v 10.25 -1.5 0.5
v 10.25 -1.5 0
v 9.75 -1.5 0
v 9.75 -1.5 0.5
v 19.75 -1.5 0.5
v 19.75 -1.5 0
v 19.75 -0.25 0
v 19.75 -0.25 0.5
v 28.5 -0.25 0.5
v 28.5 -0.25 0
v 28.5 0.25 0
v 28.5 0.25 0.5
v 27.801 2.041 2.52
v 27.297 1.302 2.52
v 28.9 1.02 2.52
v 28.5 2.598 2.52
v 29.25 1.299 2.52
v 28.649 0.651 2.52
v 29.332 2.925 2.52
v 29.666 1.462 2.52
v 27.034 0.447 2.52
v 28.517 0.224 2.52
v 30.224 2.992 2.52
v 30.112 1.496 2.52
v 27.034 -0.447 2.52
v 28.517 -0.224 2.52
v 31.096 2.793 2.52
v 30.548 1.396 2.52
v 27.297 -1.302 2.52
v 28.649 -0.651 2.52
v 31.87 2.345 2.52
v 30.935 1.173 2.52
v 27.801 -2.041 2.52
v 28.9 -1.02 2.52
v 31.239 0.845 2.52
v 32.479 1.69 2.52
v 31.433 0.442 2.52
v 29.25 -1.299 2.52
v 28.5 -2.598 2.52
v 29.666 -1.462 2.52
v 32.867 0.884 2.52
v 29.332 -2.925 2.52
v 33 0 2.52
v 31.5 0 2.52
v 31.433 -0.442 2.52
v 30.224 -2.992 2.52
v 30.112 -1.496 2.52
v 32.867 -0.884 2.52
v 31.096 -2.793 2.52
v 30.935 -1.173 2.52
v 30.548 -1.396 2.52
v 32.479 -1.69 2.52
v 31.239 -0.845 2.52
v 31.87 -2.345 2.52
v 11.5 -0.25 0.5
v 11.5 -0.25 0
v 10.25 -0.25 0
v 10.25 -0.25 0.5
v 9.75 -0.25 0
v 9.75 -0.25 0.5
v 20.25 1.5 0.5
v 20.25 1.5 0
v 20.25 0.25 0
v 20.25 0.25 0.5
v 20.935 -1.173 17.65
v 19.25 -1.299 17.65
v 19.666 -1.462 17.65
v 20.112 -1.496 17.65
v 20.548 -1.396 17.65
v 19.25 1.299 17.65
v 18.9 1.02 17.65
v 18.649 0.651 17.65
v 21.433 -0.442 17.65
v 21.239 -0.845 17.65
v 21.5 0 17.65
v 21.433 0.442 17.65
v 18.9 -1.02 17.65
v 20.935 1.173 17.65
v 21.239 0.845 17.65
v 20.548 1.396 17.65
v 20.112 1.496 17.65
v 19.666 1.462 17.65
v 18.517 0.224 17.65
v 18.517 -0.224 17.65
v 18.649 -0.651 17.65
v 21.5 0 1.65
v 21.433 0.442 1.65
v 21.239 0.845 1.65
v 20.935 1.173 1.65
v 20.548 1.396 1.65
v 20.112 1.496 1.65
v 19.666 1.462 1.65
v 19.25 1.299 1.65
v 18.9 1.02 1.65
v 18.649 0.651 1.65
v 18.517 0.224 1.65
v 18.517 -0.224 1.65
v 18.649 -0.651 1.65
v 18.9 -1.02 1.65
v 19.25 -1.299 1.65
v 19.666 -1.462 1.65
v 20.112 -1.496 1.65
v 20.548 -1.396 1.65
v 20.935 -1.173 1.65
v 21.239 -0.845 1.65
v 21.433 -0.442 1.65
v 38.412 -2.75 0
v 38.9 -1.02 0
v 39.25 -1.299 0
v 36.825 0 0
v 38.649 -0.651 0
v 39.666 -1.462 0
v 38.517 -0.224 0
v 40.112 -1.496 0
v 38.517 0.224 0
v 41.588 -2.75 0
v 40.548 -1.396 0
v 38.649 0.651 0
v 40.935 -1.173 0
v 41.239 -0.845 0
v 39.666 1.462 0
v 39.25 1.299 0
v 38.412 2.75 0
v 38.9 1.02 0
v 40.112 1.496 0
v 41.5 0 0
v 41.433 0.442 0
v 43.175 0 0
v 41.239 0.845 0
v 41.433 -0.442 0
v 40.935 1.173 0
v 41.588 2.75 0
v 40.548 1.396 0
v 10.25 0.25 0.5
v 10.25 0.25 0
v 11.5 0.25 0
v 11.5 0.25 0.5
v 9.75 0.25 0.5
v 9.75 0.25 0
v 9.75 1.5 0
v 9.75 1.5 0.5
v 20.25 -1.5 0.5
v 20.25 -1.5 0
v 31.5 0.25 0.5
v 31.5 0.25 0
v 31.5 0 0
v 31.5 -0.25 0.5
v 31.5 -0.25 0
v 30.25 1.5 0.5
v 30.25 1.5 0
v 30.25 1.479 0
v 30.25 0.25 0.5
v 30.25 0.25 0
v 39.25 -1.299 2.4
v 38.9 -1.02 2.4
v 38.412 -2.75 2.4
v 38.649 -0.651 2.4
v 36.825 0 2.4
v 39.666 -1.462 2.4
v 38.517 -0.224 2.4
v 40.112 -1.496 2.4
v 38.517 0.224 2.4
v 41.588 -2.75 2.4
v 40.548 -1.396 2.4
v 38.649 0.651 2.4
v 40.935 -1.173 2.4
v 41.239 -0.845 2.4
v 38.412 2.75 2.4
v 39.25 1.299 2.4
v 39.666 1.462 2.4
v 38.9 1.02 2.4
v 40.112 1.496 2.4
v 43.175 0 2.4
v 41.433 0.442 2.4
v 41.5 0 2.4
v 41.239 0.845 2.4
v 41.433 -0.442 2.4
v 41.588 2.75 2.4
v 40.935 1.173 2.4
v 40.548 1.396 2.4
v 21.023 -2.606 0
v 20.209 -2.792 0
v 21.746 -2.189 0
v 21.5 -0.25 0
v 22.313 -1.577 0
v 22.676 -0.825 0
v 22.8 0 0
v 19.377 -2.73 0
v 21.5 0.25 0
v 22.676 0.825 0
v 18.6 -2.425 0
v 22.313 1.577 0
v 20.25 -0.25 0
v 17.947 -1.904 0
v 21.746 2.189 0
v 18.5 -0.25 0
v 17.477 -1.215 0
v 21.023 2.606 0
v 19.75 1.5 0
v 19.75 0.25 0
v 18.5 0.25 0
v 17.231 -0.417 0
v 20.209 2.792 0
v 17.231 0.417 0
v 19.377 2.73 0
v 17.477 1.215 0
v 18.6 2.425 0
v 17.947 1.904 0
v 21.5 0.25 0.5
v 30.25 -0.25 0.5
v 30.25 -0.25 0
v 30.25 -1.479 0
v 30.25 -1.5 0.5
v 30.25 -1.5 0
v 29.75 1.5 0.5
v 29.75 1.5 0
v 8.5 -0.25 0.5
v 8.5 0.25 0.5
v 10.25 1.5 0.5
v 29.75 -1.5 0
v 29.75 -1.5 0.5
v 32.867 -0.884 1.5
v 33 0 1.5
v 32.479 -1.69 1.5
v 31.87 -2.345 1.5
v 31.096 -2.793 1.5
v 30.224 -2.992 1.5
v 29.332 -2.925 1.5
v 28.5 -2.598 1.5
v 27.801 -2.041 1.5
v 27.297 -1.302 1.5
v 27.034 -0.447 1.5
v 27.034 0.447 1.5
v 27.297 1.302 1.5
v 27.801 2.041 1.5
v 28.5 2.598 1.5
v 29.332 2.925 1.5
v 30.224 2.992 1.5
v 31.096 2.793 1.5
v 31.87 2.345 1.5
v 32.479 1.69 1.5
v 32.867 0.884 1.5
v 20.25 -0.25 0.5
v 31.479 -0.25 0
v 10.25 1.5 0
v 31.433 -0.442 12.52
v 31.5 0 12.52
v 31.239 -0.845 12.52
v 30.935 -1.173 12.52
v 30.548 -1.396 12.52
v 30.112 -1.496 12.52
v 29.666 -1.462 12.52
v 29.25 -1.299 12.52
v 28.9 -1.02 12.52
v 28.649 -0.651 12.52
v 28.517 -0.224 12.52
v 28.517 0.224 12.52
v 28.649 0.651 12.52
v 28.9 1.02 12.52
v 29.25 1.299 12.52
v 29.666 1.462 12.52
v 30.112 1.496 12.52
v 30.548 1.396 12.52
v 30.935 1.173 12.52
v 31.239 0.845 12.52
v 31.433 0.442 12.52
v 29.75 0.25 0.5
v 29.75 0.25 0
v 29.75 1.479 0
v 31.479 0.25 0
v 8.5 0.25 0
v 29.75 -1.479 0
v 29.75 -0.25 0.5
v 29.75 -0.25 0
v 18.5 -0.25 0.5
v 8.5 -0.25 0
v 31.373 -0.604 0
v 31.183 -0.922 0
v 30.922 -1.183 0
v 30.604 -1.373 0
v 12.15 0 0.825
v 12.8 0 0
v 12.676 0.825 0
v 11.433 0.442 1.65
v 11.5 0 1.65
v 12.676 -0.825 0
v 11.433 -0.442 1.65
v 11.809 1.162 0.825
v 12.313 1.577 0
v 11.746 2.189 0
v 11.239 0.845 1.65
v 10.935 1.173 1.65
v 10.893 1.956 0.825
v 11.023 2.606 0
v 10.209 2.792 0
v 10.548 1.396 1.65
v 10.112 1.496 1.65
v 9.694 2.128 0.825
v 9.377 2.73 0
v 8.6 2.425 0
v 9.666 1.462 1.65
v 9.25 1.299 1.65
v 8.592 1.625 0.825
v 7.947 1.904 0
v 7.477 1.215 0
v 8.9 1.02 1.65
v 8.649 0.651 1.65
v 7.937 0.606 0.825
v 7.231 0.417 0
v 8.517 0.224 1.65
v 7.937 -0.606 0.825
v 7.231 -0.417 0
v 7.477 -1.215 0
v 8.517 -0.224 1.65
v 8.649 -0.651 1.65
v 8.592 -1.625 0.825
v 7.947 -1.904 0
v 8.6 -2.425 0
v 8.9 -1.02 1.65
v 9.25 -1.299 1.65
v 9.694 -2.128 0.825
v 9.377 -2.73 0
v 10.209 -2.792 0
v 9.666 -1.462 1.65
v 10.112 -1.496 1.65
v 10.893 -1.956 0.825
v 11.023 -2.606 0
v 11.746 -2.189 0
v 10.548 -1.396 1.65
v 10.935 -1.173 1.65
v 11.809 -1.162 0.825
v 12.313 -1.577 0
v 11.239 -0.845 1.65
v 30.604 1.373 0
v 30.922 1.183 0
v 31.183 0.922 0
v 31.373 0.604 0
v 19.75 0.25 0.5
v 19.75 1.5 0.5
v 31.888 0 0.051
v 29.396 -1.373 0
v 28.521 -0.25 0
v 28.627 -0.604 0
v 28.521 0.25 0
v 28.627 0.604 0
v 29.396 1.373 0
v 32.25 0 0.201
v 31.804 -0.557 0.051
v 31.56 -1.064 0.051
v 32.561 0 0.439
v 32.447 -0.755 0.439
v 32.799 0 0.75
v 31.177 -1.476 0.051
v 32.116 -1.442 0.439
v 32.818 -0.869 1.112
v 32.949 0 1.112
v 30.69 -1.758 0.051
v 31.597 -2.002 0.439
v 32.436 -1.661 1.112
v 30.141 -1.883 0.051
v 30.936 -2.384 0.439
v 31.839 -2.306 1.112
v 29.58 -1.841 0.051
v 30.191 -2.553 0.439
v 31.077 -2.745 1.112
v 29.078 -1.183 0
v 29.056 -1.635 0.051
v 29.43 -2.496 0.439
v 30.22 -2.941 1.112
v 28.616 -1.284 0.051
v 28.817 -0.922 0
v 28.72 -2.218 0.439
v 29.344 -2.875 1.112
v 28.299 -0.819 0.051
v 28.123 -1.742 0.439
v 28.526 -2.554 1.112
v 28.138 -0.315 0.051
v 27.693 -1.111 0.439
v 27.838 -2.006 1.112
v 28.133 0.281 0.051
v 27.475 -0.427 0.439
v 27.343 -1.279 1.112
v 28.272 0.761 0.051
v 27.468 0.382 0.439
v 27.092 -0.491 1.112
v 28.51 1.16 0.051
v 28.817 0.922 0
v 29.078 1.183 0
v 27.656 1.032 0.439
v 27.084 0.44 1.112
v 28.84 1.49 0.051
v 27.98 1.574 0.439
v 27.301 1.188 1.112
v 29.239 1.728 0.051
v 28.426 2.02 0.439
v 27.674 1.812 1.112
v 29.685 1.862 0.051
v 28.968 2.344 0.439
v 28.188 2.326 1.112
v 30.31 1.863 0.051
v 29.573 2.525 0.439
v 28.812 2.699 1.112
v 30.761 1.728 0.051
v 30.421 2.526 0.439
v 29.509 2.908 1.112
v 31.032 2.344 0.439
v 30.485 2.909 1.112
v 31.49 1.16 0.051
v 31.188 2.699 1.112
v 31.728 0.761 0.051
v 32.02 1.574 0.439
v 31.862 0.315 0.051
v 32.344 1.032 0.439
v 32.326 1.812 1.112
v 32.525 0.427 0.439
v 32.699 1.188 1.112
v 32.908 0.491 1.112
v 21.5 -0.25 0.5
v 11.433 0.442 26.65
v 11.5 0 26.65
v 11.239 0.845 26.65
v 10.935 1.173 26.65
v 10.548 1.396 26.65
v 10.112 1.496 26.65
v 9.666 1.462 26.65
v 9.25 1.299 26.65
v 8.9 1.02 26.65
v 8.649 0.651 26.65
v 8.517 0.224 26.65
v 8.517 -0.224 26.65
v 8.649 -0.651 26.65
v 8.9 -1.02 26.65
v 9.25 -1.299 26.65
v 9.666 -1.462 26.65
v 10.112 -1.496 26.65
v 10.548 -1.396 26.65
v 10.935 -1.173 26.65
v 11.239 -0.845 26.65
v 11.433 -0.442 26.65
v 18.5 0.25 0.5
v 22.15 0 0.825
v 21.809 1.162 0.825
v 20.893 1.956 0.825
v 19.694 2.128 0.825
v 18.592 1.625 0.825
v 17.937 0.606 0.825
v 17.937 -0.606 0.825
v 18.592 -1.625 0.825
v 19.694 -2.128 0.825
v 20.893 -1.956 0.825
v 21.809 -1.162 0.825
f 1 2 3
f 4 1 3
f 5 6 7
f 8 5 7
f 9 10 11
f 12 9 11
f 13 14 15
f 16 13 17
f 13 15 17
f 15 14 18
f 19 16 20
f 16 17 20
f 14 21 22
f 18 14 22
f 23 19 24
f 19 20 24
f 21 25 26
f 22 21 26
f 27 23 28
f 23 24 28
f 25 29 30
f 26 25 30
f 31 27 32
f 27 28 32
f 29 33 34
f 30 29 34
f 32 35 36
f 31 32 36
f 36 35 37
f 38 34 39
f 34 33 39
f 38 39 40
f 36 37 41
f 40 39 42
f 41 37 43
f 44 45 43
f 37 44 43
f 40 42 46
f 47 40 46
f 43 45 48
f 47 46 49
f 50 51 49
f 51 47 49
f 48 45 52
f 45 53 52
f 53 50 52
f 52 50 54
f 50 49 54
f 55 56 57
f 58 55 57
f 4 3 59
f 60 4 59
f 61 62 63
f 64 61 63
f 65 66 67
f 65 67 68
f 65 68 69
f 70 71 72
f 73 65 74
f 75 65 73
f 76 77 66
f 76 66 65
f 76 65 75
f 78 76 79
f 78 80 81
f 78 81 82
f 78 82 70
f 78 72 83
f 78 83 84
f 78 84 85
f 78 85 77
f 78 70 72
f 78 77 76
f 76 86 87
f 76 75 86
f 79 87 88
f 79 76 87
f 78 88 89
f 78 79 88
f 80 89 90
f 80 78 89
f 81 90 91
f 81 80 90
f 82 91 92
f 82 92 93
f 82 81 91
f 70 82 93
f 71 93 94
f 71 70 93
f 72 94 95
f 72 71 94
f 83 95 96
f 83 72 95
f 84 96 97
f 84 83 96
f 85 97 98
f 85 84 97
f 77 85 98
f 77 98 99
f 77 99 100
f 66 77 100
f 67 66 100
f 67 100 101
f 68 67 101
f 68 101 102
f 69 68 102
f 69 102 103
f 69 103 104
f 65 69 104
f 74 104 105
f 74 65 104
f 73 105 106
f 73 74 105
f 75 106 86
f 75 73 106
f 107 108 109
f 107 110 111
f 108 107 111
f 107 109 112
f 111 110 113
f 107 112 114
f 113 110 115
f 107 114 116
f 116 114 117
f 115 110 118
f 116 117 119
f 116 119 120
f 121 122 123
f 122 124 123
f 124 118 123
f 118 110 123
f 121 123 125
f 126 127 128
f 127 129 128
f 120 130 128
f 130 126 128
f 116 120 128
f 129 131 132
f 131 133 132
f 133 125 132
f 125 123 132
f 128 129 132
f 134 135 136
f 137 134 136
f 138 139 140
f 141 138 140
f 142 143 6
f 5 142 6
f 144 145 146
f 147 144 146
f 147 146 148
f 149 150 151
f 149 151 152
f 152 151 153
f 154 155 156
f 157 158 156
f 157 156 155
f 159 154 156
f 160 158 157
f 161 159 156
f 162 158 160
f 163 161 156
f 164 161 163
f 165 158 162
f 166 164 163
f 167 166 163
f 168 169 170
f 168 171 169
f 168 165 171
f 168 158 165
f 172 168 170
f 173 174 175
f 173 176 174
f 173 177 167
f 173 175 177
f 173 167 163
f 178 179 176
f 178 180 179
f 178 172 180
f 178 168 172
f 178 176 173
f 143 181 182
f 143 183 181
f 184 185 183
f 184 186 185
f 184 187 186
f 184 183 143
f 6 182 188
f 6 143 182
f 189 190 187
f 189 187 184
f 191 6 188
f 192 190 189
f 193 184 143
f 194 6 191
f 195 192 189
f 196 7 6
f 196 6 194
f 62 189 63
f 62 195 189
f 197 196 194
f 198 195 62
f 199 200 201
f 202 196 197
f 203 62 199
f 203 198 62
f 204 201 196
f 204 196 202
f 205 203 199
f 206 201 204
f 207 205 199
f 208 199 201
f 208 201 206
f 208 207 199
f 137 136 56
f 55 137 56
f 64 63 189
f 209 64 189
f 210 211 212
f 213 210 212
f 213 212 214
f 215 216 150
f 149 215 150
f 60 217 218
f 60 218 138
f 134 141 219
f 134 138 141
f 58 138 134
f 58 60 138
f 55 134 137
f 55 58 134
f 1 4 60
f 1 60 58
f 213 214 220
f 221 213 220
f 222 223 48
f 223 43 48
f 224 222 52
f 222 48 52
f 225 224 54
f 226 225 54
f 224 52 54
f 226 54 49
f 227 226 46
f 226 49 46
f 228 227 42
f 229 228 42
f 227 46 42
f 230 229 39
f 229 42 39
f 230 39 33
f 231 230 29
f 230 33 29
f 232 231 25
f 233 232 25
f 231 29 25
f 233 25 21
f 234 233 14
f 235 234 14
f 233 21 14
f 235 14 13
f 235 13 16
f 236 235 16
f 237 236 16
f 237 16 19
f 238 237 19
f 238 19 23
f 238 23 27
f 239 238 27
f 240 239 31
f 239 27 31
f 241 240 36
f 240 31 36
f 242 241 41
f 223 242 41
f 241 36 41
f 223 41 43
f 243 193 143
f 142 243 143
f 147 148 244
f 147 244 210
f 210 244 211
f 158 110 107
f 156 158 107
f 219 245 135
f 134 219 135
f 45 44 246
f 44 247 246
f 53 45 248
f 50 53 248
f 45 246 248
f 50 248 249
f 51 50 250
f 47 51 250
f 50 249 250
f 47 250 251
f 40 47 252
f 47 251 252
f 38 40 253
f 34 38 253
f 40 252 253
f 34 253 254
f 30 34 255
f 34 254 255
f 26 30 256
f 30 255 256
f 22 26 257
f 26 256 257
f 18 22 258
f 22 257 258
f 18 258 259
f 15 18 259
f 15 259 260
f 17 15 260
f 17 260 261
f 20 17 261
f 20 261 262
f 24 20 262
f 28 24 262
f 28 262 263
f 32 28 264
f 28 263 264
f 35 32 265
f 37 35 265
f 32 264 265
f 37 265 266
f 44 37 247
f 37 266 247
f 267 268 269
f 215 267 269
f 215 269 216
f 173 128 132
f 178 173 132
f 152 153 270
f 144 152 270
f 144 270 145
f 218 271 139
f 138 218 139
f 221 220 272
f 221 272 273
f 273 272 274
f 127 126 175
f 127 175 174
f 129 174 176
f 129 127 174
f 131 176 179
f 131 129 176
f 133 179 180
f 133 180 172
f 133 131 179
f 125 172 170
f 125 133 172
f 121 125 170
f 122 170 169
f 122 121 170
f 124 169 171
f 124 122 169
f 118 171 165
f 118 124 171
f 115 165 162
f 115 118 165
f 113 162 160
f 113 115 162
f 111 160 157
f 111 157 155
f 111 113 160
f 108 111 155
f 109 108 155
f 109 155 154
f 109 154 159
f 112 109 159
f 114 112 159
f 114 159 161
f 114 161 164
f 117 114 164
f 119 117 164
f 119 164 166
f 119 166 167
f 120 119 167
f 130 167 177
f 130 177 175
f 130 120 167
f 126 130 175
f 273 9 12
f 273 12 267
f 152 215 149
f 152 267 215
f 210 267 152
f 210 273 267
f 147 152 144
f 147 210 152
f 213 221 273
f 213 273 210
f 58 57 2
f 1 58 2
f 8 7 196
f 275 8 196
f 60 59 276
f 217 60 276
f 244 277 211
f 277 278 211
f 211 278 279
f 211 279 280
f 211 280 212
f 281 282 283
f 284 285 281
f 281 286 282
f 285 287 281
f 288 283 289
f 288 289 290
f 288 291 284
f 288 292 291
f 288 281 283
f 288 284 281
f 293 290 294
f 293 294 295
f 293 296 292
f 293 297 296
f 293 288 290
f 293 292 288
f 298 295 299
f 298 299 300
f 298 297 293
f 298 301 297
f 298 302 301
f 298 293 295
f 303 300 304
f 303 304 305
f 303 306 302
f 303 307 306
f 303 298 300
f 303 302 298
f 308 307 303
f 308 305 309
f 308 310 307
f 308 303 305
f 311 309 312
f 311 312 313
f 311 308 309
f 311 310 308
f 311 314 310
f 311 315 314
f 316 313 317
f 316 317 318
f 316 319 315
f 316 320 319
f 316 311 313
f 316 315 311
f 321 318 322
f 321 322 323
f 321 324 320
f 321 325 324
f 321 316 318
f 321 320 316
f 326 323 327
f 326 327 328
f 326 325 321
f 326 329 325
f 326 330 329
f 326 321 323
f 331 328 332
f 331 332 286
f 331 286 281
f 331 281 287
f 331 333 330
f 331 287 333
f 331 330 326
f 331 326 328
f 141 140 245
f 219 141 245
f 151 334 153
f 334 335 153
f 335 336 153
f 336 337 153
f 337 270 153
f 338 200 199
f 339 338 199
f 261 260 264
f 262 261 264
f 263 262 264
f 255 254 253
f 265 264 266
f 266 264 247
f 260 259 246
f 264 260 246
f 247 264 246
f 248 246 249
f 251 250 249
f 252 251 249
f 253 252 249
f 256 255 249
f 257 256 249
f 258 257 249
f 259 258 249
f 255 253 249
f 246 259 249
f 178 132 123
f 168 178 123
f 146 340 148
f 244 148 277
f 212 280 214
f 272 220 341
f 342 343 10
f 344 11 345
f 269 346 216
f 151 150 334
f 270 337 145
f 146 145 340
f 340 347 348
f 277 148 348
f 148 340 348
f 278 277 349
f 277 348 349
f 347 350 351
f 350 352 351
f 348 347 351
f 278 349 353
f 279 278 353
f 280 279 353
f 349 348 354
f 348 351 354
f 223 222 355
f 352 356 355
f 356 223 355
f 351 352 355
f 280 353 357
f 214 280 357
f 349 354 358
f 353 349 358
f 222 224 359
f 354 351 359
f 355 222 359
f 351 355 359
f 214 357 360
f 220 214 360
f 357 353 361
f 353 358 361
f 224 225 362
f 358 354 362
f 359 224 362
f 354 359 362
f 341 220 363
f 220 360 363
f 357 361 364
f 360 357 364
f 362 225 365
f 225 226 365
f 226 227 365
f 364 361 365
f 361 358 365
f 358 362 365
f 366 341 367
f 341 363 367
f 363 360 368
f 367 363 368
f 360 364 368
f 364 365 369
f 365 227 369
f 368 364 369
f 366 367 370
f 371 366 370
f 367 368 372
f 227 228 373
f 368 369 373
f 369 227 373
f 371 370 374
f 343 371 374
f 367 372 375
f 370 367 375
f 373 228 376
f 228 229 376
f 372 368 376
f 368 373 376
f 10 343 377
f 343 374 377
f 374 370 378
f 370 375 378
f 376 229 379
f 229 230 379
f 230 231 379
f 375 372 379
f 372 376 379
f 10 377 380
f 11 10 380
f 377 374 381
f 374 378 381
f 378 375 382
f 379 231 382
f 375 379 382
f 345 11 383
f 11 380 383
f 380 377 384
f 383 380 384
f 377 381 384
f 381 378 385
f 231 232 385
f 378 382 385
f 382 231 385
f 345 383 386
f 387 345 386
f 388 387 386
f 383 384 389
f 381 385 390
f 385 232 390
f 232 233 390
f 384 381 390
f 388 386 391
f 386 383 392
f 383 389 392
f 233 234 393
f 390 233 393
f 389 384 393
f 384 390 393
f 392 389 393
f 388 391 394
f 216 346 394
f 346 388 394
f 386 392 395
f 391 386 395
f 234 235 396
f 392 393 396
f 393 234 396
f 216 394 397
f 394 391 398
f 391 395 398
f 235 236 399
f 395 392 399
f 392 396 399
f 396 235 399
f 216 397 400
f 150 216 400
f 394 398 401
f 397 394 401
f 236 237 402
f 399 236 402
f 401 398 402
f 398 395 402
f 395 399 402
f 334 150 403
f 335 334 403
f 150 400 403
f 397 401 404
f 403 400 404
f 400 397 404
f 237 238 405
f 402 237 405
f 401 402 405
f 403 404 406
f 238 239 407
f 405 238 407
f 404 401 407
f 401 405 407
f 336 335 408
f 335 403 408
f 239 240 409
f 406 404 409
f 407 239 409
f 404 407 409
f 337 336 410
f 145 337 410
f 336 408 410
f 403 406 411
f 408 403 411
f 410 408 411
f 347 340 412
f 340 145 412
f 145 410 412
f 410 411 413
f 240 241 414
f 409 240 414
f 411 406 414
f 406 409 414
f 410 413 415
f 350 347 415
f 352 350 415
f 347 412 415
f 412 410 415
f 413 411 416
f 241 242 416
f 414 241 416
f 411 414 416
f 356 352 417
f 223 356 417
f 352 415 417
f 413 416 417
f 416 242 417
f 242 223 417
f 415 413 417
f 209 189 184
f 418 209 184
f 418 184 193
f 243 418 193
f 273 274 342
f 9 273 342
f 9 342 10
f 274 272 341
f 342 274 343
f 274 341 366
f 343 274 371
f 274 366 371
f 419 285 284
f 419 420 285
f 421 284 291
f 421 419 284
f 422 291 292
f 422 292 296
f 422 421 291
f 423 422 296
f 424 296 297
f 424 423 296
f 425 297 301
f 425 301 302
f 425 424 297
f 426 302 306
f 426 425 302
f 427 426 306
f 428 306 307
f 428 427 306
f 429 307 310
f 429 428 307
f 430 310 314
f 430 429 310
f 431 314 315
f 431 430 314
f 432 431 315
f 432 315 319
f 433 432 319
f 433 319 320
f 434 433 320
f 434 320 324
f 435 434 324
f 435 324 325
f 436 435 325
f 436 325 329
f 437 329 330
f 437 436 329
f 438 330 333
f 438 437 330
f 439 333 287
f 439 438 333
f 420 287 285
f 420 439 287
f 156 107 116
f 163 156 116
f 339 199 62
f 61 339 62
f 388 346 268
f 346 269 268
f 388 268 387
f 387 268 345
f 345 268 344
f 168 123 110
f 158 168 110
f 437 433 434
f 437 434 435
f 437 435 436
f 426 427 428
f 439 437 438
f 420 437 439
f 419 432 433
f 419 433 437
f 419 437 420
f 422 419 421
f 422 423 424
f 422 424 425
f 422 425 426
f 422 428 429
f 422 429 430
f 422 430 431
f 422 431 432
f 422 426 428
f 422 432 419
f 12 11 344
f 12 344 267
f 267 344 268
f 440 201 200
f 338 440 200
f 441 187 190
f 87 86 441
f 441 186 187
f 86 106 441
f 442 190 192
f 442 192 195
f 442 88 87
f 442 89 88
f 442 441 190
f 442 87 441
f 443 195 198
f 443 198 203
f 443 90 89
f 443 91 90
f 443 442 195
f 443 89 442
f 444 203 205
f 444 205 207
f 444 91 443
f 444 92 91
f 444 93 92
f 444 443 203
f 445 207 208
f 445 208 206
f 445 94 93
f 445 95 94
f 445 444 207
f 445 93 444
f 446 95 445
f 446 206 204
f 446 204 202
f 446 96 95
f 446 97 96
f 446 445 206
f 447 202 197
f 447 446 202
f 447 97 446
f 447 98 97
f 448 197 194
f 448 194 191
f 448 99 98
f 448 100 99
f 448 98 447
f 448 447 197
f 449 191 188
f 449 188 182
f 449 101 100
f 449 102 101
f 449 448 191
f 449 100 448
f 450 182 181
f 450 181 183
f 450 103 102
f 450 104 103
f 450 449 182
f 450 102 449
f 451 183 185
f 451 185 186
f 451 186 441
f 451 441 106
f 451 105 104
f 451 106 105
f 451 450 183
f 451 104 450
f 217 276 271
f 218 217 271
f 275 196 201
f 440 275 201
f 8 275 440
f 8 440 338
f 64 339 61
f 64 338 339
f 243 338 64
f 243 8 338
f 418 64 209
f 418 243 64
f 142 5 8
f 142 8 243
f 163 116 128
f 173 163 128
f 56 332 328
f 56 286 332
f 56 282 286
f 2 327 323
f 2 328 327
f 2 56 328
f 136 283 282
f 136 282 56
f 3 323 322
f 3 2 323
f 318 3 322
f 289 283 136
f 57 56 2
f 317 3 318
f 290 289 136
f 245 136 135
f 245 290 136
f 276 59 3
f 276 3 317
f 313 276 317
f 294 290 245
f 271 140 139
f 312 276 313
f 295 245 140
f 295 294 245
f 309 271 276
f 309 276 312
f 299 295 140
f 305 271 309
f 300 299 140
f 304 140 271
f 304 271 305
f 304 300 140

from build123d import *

# Parameters (mm, degrees)
F4_R     = 1.5
F5_DEPTH = 2.4
F7_DEPTH = 0.5


with BuildPart() as f1:
    # F0 (on Front) → F1 (revolve)
    with BuildSketch(Plane.XZ):
        Polygon((11.5, 26.65), (10, 26.65), (10, 0), (12.8, 0), (11.5, 1.65), align=None)
    revolve(axis=Axis((10, 0, 13.325), (0, 0, 1)))


with BuildPart() as f2:
    # F0 (on Front) → F2 (revolve)
    with BuildSketch(Plane.XZ):
        Polygon((21.5, 17.65), (20, 17.65), (20, 0), (22.8, 0), (21.5, 1.65), align=None)
    revolve(axis=Axis((20, 0, 8.825), (0, 0, 1)))


with BuildPart() as f3:
    # F0 (on Front) → F3 (revolve)
    with BuildSketch(Plane.XZ):
        with BuildLine():
            Line((31.5, 12.52), (30, 12.52))
            Line((30, 12.52), (30, 0))
            Line((30, 0), (31.5, 0))
            ThreePointArc((31.5, 0), (32.56066, 0.43934), (33, 1.5))
            Line((33, 1.5), (33, 2.52))
            Line((33, 2.52), (31.5, 2.52))
            Line((31.5, 2.52), (31.5, 12.52))
        make_face()
    revolve(axis=Axis((30, 0, 6.26), (0, 0, -1)))


with BuildPart() as f5:
    # F4 (on Top) → F5 (new body)
    with BuildSketch(Plane.XY):
        Polygon((41.587713, -2.75), (43.175426, 0), (41.587713, 2.75), (38.412287, 2.75), (36.824574, 0), (38.412287, -2.75), align=None)
        with Locations((40, 0)):
            Circle(F4_R, mode=Mode.SUBTRACT)
    extrude(amount=F5_DEPTH)


with BuildPart() as f7_tool:
    # F6 (on face) → F7 (new body)
    with BuildSketch(Plane(origin=(0, 0, 0), x_dir=(1, 0, 0), z_dir=(0, 0, -1))):
        Polygon((9.75, -1.5), (10.25, -1.5), (10.25, -0.25), (11.5, -0.25), (11.5, 0.25), (10.25, 0.25), (10.25, 1.5), (9.75, 1.5), (9.75, 0.25), (8.5, 0.25), (8.5, -0.25), (9.75, -0.25), align=None)
        Polygon((19.75, -1.5), (20.25, -1.5), (20.25, -0.25), (21.5, -0.25), (21.5, 0.25), (20.25, 0.25), (20.25, 1.5), (19.75, 1.5), (19.75, 0.25), (18.5, 0.25), (18.5, -0.25), (19.75, -0.25), align=None)
        Polygon((29.75, -1.5), (30.25, -1.5), (30.25, -0.25), (31.5, -0.25), (31.5, 0.25), (30.25, 0.25), (30.25, 1.5), (29.75, 1.5), (29.75, 0.25), (28.5, 0.25), (28.5, -0.25), (29.75, -0.25), align=None)
    extrude(amount=-F7_DEPTH)


with BuildPart() as f1_1:
    add(f1.part)

    # F7: cut by f7_tool
    add(f7_tool.part, mode=Mode.SUBTRACT)


with BuildPart() as f2_1:
    add(f2.part)

    # F7: cut by f7_tool
    add(f7_tool.part, mode=Mode.SUBTRACT)


with BuildPart() as f3_1:
    add(f3.part)

    # F7: cut by f7_tool
    add(f7_tool.part, mode=Mode.SUBTRACT)


solid = Compound([f5.part, f1_1.part, f2_1.part, f3_1.part])
